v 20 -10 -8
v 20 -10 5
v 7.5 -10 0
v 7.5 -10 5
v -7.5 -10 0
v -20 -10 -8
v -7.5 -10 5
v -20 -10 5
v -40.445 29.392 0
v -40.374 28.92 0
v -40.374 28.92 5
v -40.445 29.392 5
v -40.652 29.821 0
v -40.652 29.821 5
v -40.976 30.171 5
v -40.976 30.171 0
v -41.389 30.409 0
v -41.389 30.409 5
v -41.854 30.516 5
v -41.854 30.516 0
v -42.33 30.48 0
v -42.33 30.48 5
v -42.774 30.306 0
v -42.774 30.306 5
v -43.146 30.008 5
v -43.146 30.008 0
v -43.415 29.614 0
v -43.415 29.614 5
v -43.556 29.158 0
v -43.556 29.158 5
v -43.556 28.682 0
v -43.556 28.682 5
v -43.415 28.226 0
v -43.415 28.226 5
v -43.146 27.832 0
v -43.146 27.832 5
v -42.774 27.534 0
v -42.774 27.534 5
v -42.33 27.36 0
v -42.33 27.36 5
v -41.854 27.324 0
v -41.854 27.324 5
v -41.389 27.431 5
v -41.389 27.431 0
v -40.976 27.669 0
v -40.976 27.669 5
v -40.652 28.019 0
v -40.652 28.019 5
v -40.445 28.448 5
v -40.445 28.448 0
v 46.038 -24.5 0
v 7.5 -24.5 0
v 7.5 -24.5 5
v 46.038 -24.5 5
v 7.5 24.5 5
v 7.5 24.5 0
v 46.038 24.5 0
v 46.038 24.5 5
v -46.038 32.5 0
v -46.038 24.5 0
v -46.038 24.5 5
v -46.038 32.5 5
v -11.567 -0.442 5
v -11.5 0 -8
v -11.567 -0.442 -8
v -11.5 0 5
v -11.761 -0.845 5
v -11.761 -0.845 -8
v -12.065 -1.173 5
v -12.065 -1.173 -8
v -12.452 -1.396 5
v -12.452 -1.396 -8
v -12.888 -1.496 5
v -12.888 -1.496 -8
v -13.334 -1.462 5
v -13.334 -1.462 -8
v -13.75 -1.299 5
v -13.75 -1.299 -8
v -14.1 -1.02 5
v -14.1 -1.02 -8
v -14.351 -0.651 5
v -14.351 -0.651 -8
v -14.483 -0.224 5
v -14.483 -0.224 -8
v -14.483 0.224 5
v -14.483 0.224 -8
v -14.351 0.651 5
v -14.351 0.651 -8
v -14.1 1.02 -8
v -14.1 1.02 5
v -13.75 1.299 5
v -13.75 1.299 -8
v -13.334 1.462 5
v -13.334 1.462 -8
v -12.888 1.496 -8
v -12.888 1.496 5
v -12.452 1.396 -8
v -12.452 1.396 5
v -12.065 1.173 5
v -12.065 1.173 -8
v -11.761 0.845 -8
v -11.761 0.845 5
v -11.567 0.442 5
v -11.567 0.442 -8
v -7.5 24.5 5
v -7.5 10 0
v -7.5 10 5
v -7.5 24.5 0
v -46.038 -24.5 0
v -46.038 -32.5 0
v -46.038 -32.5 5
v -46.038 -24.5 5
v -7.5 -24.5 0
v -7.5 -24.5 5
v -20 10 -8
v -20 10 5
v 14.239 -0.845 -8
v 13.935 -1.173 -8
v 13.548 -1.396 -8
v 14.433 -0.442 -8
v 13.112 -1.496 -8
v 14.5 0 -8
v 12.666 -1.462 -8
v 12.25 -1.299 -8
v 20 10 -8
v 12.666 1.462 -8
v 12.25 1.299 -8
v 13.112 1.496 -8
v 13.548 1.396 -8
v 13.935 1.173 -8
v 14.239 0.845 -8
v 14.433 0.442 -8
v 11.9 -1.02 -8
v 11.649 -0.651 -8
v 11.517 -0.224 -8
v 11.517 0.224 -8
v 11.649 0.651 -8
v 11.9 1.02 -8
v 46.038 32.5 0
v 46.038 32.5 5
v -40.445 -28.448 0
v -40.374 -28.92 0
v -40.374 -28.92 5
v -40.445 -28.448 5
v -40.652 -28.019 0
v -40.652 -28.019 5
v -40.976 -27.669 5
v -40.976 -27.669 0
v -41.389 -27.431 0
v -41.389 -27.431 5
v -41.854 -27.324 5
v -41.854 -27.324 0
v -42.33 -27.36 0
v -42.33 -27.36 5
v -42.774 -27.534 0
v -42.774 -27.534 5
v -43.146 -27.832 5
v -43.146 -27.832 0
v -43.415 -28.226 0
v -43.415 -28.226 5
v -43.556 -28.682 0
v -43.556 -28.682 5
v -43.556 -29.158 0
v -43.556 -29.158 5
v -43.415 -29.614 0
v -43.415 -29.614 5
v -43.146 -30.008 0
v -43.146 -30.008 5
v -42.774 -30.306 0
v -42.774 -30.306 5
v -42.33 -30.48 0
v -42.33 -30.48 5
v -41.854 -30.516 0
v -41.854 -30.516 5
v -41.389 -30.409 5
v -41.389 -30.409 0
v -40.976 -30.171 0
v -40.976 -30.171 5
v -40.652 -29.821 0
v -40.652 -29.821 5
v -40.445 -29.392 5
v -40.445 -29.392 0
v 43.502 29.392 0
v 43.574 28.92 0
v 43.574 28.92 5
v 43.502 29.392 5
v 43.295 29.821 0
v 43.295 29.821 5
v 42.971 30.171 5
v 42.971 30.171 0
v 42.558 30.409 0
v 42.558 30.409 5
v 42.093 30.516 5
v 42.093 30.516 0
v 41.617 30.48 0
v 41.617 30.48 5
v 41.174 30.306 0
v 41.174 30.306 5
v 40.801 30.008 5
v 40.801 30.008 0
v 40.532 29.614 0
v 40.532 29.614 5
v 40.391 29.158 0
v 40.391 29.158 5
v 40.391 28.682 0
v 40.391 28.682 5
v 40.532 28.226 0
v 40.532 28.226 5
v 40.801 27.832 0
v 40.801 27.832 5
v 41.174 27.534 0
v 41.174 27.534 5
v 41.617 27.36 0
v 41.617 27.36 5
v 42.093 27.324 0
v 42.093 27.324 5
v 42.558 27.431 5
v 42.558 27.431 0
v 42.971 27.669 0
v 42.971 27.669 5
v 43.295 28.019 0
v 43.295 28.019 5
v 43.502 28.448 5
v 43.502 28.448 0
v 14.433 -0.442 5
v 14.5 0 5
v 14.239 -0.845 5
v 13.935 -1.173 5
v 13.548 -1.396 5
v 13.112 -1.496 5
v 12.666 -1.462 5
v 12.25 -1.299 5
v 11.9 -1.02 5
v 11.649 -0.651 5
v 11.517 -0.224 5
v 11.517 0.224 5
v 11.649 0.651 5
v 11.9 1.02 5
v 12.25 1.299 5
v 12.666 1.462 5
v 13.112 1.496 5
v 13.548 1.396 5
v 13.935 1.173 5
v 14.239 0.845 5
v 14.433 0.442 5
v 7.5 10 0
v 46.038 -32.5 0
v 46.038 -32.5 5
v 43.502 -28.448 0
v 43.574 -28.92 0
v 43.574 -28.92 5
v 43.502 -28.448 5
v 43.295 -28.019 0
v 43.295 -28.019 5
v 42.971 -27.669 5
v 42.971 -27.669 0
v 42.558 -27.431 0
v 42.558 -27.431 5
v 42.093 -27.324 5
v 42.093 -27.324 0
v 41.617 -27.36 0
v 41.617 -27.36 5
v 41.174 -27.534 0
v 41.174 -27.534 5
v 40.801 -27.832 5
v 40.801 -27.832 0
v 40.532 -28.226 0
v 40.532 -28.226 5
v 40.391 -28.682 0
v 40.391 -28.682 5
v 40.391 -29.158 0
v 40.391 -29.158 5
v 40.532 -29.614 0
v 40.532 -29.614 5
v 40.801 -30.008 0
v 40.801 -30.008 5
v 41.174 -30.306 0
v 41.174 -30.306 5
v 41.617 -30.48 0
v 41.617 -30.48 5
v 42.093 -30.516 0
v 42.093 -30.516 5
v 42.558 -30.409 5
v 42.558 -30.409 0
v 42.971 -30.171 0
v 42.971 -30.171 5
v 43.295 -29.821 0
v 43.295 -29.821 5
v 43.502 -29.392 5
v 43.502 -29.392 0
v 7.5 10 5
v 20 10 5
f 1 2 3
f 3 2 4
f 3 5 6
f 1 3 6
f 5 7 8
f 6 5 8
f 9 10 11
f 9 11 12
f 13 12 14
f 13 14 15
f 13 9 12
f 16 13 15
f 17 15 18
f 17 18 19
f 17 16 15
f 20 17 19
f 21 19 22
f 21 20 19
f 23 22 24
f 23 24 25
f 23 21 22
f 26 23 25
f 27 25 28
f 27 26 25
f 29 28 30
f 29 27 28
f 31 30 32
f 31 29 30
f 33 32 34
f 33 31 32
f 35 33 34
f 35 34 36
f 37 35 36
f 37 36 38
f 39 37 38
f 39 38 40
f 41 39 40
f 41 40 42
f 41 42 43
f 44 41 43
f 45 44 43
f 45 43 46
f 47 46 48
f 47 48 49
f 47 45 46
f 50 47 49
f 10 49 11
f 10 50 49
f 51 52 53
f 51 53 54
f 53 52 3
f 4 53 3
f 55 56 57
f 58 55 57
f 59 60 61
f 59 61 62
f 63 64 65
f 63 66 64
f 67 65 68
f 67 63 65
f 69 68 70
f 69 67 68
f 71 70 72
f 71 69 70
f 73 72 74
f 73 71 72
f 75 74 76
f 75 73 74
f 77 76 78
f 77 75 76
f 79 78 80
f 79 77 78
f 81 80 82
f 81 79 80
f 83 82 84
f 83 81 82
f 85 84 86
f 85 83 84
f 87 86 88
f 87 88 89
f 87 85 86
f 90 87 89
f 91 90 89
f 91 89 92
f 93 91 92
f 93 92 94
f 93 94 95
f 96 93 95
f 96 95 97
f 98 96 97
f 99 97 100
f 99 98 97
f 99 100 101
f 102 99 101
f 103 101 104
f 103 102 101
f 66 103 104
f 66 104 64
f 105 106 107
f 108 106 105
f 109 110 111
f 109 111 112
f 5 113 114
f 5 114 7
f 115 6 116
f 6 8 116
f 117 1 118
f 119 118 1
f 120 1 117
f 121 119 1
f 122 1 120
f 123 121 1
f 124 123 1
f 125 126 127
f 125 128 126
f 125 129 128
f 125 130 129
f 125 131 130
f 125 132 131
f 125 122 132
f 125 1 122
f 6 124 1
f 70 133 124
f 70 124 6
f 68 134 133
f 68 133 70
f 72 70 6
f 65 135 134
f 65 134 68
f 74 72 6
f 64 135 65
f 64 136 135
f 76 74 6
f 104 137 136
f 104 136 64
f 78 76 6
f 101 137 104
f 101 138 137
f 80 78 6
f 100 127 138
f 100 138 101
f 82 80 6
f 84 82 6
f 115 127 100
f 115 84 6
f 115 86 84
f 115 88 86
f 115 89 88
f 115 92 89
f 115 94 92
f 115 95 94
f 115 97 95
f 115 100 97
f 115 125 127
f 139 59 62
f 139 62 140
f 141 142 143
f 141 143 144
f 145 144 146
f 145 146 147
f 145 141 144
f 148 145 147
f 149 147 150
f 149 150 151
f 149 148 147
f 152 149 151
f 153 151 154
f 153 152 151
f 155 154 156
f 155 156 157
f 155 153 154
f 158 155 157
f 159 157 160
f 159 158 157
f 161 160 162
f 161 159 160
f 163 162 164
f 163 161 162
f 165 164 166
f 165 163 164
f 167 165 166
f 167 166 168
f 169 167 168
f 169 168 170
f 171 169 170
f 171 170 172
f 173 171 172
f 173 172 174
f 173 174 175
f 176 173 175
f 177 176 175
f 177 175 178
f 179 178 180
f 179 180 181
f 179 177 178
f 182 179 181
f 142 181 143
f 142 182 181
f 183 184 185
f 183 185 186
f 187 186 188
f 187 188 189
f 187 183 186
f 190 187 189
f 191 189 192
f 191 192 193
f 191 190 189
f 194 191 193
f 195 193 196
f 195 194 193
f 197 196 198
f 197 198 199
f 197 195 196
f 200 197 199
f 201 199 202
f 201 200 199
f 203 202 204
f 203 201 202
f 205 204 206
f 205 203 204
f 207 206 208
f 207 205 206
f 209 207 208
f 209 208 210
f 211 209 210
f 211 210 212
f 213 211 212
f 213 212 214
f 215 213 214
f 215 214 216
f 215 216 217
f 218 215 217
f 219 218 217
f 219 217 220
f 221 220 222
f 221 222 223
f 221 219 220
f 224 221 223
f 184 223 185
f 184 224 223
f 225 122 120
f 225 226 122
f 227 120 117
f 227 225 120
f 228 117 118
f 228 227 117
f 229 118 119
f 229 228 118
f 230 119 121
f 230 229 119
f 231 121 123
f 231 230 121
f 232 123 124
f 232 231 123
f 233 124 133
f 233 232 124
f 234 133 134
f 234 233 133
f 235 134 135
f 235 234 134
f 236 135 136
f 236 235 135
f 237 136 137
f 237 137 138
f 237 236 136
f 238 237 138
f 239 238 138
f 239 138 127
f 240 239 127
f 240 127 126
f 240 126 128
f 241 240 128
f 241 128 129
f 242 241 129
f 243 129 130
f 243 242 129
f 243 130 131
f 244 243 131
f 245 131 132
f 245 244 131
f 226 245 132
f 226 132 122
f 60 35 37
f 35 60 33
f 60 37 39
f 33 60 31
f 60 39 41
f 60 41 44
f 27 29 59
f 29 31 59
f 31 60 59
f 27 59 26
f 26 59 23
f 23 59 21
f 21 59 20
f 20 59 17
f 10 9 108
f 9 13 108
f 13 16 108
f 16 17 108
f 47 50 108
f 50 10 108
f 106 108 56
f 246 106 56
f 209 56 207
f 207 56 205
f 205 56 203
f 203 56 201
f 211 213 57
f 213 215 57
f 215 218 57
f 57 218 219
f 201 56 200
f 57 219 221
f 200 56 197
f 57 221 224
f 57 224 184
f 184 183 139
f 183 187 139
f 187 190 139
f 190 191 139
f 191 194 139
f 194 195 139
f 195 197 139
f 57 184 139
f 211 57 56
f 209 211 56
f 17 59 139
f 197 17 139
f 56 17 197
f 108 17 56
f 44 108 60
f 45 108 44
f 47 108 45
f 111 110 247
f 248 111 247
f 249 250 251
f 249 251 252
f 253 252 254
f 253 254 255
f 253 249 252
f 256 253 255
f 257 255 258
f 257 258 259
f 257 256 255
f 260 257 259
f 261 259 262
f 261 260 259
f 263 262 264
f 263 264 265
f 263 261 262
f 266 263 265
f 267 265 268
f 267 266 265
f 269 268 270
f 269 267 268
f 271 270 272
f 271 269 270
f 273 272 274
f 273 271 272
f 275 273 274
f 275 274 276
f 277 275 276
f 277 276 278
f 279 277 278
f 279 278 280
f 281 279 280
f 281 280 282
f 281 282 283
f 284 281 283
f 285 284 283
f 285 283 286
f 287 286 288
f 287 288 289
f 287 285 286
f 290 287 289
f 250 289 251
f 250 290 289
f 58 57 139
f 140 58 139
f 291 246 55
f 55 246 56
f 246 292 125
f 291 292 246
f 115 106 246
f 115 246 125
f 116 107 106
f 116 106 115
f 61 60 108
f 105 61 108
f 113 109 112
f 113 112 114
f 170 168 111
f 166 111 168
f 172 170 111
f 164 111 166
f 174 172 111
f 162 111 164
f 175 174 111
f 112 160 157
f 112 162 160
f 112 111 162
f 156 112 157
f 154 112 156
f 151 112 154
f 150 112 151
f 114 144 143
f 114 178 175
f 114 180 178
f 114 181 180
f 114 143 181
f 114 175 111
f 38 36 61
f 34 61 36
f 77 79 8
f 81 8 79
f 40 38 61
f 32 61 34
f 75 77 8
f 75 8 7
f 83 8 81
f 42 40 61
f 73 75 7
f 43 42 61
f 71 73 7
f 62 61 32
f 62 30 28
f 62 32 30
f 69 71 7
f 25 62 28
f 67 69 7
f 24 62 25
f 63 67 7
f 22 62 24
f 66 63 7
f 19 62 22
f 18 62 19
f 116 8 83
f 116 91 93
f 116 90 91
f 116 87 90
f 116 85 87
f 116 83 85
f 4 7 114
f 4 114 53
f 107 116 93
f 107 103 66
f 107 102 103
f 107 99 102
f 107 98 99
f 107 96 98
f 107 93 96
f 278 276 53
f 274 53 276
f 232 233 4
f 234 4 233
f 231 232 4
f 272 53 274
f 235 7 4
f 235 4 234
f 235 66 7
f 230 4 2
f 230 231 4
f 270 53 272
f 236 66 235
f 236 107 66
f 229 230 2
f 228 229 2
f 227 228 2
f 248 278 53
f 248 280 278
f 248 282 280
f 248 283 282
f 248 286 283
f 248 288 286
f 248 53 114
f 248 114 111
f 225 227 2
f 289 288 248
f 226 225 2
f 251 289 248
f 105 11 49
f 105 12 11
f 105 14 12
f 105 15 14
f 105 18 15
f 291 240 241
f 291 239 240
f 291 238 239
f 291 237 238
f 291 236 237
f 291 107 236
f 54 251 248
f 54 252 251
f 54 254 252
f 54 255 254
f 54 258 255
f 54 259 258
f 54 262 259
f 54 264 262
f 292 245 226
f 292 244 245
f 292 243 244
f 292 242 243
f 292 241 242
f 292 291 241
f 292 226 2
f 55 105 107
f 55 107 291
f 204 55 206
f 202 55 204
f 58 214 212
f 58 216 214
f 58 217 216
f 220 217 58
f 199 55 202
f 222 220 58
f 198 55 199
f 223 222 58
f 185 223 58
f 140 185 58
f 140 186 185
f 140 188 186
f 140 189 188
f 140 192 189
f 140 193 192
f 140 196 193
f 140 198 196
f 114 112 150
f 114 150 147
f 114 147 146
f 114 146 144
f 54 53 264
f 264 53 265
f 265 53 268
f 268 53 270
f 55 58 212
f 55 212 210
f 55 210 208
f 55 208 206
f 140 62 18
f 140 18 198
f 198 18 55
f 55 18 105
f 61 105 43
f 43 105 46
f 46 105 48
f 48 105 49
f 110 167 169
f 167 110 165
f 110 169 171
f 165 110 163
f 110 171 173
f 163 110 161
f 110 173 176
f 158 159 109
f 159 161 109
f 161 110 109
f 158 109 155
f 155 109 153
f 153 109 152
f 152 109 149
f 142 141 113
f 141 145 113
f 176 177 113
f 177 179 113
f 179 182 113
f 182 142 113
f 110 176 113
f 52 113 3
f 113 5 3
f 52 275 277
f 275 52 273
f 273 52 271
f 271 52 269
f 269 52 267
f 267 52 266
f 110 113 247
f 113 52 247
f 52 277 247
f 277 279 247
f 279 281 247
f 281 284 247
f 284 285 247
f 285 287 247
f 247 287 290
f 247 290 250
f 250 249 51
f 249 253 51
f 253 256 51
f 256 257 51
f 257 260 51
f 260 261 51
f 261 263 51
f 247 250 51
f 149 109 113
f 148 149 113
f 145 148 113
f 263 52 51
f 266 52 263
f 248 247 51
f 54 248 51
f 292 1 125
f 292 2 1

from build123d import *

# Parameters (mm, degrees)
SKETCH_1_W          = 92.075
SKETCH_1_H          = 8
SKETCH_1_R          = 1.6
SKETCH_1_W_2        = 12.5
SKETCH_1_H_2        = 20
SKETCH_1_W_3        = 15
SKETCH_1_H_3        = 14.5
EXTRUDE_1_DEPTH     = 5
SKETCH_2_R          = 1.5
CUT_EXTRUDE_1_DEPTH = 10
SKETCH_4_W          = 40
SKETCH_4_H          = 20
SKETCH_4_R          = 1.5
EXTRUDE_3_DEPTH     = 8


with BuildPart() as part:
    # 草图1 → 凸台-拉伸1 (new body)
    # profile 1 of 7: a face of its own
    with BuildSketch(Plane.XY):
        with Locations((0, 28.5)):
            Rectangle(SKETCH_1_W, SKETCH_1_H)
        with Locations((41.9735, 28.92)):
            Circle(SKETCH_1_R, mode=Mode.SUBTRACT)
        with Locations((-41.9735, 28.92)):
            Circle(SKETCH_1_R, mode=Mode.SUBTRACT)
    # profile 2 of 7: a face of its own
    with BuildSketch(Plane.XY):
        with Locations((13.75, 0)):
            Rectangle(SKETCH_1_W_2, SKETCH_1_H_2)
    # profile 3 of 7: a face of its own
    with BuildSketch(Plane.XY):
        Rectangle(SKETCH_1_W_3, SKETCH_1_H_2)
    # profile 4 of 7: a face of its own
    with BuildSketch(Plane.XY):
        with Locations((-13.75, 0)):
            Rectangle(SKETCH_1_W_2, SKETCH_1_H_2)
    # profile 5 of 7: a face of its own
    with BuildSketch(Plane.XY):
        with Locations((0, 17.25)):
            Rectangle(SKETCH_1_W_3, SKETCH_1_H_3)
    # profile 6 of 7: a face of its own
    with BuildSketch(Plane.XY):
        with Locations((0, -28.5)):
            Rectangle(SKETCH_1_W, SKETCH_1_H)
        with Locations((-41.9735, -28.92)):
            Circle(SKETCH_1_R, mode=Mode.SUBTRACT)
        with Locations((41.9735, -28.92)):
            Circle(SKETCH_1_R, mode=Mode.SUBTRACT)
    # profile 7 of 7: a face of its own
    with BuildSketch(Plane.XY):
        with Locations((0, -17.25)):
            Rectangle(SKETCH_1_W_3, SKETCH_1_H_3)
    extrude(amount=EXTRUDE_1_DEPTH)

    # 草图2 → 切除-拉伸1 (cut)
    with BuildSketch(Plane.XY.offset(5)):
        with Locations((13, 0)):
            Circle(SKETCH_2_R)
        with Locations((-13, 0)):
            Circle(SKETCH_2_R)
    extrude(amount=-CUT_EXTRUDE_1_DEPTH, mode=Mode.SUBTRACT)

    # 草图4 → 凸台-拉伸3 (add)
    with BuildSketch(Plane(origin=(0, 0, 0), x_dir=(-1, 0, 0), z_dir=(0, 0, -1))):
        Rectangle(SKETCH_4_W, SKETCH_4_H)
        with Locations(Location((-13, 0, 0), (0, 0, 180))):
            Circle(SKETCH_4_R, mode=Mode.SUBTRACT)
        with Locations(Location((13, 0, 0), (0, 0, 180))):
            Circle(SKETCH_4_R, mode=Mode.SUBTRACT)
    extrude(amount=EXTRUDE_3_DEPTH)


solid = part.part
